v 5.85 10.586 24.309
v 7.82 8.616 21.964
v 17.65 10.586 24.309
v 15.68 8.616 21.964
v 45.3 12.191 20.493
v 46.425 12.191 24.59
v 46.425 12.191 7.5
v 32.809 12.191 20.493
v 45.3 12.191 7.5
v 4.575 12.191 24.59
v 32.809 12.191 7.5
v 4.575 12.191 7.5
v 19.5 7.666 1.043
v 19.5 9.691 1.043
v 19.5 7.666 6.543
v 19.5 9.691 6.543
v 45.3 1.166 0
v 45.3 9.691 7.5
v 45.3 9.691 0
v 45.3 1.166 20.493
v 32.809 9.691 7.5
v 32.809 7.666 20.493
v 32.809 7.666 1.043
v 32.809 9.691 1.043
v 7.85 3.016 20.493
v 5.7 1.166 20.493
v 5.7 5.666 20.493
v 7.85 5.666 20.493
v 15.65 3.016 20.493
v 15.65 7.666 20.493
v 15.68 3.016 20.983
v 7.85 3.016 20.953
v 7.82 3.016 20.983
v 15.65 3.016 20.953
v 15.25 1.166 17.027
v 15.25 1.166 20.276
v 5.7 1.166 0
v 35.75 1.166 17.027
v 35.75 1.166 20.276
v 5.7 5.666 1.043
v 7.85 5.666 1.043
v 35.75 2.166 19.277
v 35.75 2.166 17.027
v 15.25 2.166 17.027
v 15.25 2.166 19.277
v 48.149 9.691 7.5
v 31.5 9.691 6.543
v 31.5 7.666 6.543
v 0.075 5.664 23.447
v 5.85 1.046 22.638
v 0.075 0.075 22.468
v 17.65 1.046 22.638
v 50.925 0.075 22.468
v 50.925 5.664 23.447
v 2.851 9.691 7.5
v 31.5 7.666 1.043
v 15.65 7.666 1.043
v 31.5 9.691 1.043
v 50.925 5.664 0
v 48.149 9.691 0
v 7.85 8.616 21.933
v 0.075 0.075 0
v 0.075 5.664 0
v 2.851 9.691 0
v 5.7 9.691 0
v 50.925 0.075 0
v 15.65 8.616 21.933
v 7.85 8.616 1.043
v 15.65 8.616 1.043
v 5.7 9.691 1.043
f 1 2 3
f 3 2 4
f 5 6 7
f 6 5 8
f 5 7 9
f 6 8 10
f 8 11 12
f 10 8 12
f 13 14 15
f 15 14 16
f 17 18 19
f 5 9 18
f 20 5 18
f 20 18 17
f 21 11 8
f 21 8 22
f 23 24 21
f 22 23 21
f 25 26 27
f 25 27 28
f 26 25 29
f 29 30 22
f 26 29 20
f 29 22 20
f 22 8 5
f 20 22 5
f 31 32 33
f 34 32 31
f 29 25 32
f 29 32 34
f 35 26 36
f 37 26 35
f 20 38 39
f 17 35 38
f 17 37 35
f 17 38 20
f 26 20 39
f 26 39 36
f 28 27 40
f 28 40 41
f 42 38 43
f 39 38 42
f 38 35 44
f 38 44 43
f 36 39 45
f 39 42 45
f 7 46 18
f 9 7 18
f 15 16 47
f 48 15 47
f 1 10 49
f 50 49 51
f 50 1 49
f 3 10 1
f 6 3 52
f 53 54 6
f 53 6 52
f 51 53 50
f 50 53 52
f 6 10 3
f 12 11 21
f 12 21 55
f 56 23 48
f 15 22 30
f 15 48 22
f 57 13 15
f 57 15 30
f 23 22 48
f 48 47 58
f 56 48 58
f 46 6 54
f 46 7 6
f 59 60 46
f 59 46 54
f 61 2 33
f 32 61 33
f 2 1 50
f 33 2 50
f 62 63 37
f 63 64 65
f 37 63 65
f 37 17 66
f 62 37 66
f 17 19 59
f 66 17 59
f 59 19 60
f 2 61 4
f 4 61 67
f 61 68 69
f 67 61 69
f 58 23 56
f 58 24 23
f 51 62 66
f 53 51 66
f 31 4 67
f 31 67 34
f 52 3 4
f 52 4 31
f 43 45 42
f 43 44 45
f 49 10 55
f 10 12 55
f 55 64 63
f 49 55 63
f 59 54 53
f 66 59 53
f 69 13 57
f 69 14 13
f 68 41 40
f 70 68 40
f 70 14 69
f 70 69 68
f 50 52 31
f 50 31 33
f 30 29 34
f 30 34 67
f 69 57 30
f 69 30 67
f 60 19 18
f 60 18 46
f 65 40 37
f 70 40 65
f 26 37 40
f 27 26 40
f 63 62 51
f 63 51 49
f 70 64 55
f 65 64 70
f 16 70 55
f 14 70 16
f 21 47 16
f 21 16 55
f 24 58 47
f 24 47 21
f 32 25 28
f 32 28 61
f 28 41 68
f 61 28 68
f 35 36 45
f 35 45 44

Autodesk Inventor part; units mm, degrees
ref_plane "YZ Plane" through (0, 0, 0) normal (1, 0, 0) x (0, 1, 0)
ref_plane "XZ Plane" through (0, 0, 0) normal (0, 1, 0) x (-1, 0, 0)
sketch "Sketch1" plane through (0, 0, 0) normal (0, 0, 1) x (1, 0, 0)
  line L0 (0, 0) -> (51, 0)
  line L1 (51, 0) -> (51, 5.739)
  line L2 (51, 5.739) -> (0, 5.739) construction
  line L3 (0, 5.739) -> (0, 0)
  line L4 (4.5, 5.739) -> (46.5, 5.739)
  line L5 (46.5, 5.739) -> (46.5, 12.266) construction
  line L6 (46.5, 12.266) -> (4.5, 12.266)
  line L7 (4.5, 12.266) -> (4.5, 5.739) construction
  line L8 (4.5, 12.266) -> (0, 5.739)
  line L9 (46.5, 12.266) -> (51, 5.739)
  dimension "d0" = 51
  dimension "d1" = 5.739
  dimension "d2" = 42
  dimension "d3" = 4.5
  dimension "d4" = 12.266
extrude "Extrusion1" add sketch "Sketch1" along normal blind 22.455
sketch "Sketch2" plane through (51, 0, 0) normal (1, 0, 0) x (0, 0, -1)
  line L0 (-22.455, 12.266) -> (-22.455, 5.739) projected
  line L1 (-22.455, 12.266) -> (-24.603, 12.266)
  line L2 (-22.455, 5.739) -> (-22.455, 0) projected
  line L3 (-24.603, 12.266) -> (-22.455, 0)
  line L4 (-22.455, 0) -> (-22.455, 12.266)
  point P0 (0, 0)
  dimension "d7" = 2.148
extrude "Extrusion2" add sketch "Sketch2" against normal up to surface (51 mm away)
sketch "Sketch3" plane through (0, 0, 0) normal (0, 0, -1) x (-1, 0, 0)
  line L0 (-51, 5.739) -> (-46.5, 12.266) projected
  line L1 (-46.5, 12.266) -> (-51, 5.739)
  line L2 (-51, 5.739) -> (-60.9571, 11.6755)
  line L3 (-60.9571, 11.6755) -> (-47.5167, 21.4504)
  line L4 (-47.5167, 21.4504) -> (-46.5, 12.266)
  line L5 (-4.5, 12.266) -> (0, 12.266) projected
  line L6 (-46.5, 12.266) -> (-4.5, 12.266)
  line L7 (-4.5, 12.266) -> (0, 5.739) projected
  line L8 (-4.5, 12.266) -> (0, 5.739)
  line L9 (0, 5.739) -> (11.7434, 10.0464)
  line L10 (11.7434, 10.0464) -> (6.509, 19.8561)
  line L11 (6.509, 19.8561) -> (-3.5865, 15.5171)
  line L12 (-3.5865, 15.5171) -> (-4.5, 12.266)
  point P0 (0, 0)
extrude "Extrusion3" cut sketch "Sketch3" against normal up to surface surface through (51, 0, 22.455) normal (0, -0.1725, 0.985)
sketch "Sketch4" plane through (4.5, 12.266, 0) normal (0, 1, 0) x (1, 0, 0)
  line L0 (1.5, -1.193) -> (40.5, -1.193)
  line L1 (40.5, -1.193) -> (40.5, -20.193)
  line L2 (40.5, -20.193) -> (1.5, -20.193)
  line L3 (1.5, -20.193) -> (1.5, -1.193)
  line L4 (-4.5, 0) -> (-4.5, -23.46) projected
  line L5 (46.5, 0) -> (46.5, -23.46) projected
  line L6 (42, 0) -> (0, 0) projected
  dimension "d12" = 39
  dimension "d13" = 6
  dimension "d14" = 51
  dimension "d15" = 1.193
  dimension "d16" = 19
extrude "Extrusion4" cut sketch "Sketch4" against normal blind 11.1
sketch "Sketch5" plane through (6, 12.266, 1.193) normal (0, 0, 1) x (1, 0, 0)
  line L0 (8.3, -6.1) -> (13.3, -6.1)
  line L1 (13.3, -6.1) -> (13.3, -3.6)
  line L2 (13.3, -3.6) -> (8.3, -3.6)
  line L3 (8.3, -3.6) -> (8.3, -6.1)
  line L4 (25.7, -6.1) -> (30.7, -6.1)
  line L5 (30.7, -6.1) -> (30.7, -3.6)
  line L6 (30.7, -3.6) -> (25.7, -3.6)
  line L7 (25.7, -3.6) -> (25.7, -6.1)
  line L8 (0, -11.1) -> (39, -11.1) projected
  line L9 (15.3, -4.0951) -> (23.7, -4.0951) construction
  line L10 (23.7, -4.0951) -> (23.7, -9.0951) construction
  line L11 (23.7, -9.0951) -> (15.3, -9.0951) construction
  line L12 (15.3, -9.0951) -> (15.3, -4.0951) construction
  line L13 (0, 0) -> (0, -11.1) projected
  line L14 (39, 0) -> (39, -11.1) projected
  point P0 (-6, -12.266)
  dimension "d19" = 5
  dimension "d20" = 5
  dimension "d23" = 2.5
  dimension "d24" = 5
  dimension "d25" = 0
  dimension "d26" = 5
  dimension "d27" = 8.4
  dimension "d28" = 5
  dimension "d29" = 15.3
  dimension "d30" = 15.3
  dimension "d31" = 2
  dimension "d32" = 2
extrude "Extrusion5" add sketch "Sketch5" along normal blind 6
sketch "Sketch6" plane through (4.5, 1.166, 0) normal (0, 1, 0) x (1, 0, 0)
  line L0 (10.75, -17.0266) -> (31.25, -17.0266)
  line L1 (31.25, -17.0266) -> (31.25, -19.2766)
  line L2 (31.25, -19.2766) -> (10.75, -19.2766)
  line L3 (10.75, -19.2766) -> (10.75, -17.0266)
  line L4 (1.5, -20.193) -> (1.5, -1.193) projected
  point P0 (-4.5, 0)
  dimension "d35" = 2.25
  dimension "d36" = 20.5
  dimension "d37" = 9.25
extrude "Extrusion6" add sketch "Sketch6" along normal blind 1
sketch "Sketch7" plane through (45, 12.266, 20.193) normal (0, 0, -1) x (-1, 0, 0)
  line L0 (37, -7.5) -> (29.5, -7.5)
  line L1 (29.5, -7.5) -> (29.5, -3.8)
  line L2 (29.5, -3.8) -> (37, -3.8)
  line L3 (37, -3.8) -> (37, -7.5)
  line L4 (0, -11.1) -> (39, -11.1) projected
  line L5 (39, 0) -> (39, -11.1) projected
  line L6 (29.75, -10.1) -> (9.25, -10.1) projected
  point P0 (45, -12.266)
  dimension "d40" = 7.5
  dimension "d41" = 3.7
  dimension "d43" = 2
  dimension "d106" = 2.6
extrude "Extrusion7" cut sketch "Sketch7" against normal blind 8.25
sketch "Sketch9" plane through (4.5, 1.166, 0) normal (0, 1, 0) x (1, 0, 0)
  line L0 (9.8, -7.193) -> (14.8, -7.193) projected
  circle A0 centre (9.8, -7.193) radius 0.5
  circle A1 centre (14.8, -7.193) radius 0.5
  circle A2 centre (27.2, -7.193) radius 0.5
  line L1 (27.2, -7.193) -> (32.2, -7.193) projected
  circle A3 centre (32.2, -7.193) radius 0.5
  point P0 (-4.5, 0)
  dimension "d51" = 1
  dimension "d52" = 1
  dimension "d53" = 1
  dimension "d54" = 1
extrude "Extrusion9" add sketch "Sketch9" along normal blind 1
sketch "Sketch10" plane through (14.3, 2.166, 7.193) normal (0, 1, 0) x (1, 0, 0)
  line L0 (0, 0) -> (5, 0) projected
  circle A0 centre (0, 0) radius 1
  line L1 (5, 6) -> (5, 0) projected
  circle A1 centre (5, 0) radius 1
  circle A2 centre (17.4, 0) radius 0.5 projected
  circle A3 centre (17.4, 0) radius 1
  line L2 (17.4, 0) -> (22.4, 0) projected
  circle A4 centre (22.4, 0) radius 1
  point P0 (-14.3, 7.193)
  dimension "d57" = 2
  dimension "d58" = 2
  dimension "d59" = 2
  dimension "d60" = 2
extrude "Extrusion10" add sketch "Sketch10" along normal blind 3 contours A1 L1 L0 | L0 L1 A1 | A0 | A2 | A3 | A4
sketch "Sketch11" plane through (14.3, 5.166, 7.193) normal (0, 1, 0) x (1, 0, 0)
  circle A0 centre (0, 0) radius 0.5 projected
  circle A1 centre (0, 0) radius 0.5
  circle A2 centre (5, 0) radius 0.5 projected
  circle A3 centre (5, 0) radius 0.5
  circle A4 centre (17.4, 0) radius 0.5 projected
  circle A5 centre (17.4, 0) radius 0.5
  circle A6 centre (22.4, 0) radius 0.5 projected
  circle A7 centre (22.4, 0) radius 0.5
  point P0 (-14.3, 7.193)
extrude "Extrusion11" add sketch "Sketch11" along normal blind 1
ref_plane "Work Plane1" through (4.65, 12.116, 0) normal (0, 1, 0) x (1, 0, 0)
sketch "Sketch13" plane through (4.65, 12.116, 0) normal (0, 1, 0) x (1, 0, 0)
  line L0 (40.35, -20.193) -> (1.35, -20.193) projected
  line L1 (1.35, -20.193) -> (40.35, -20.193)
  line L2 (40.35, -20.193) -> (40.35, -20.343)
  line L3 (40.35, -20.343) -> (1.35, -20.343)
  line L4 (40.35, -20.343) -> (40.5, -20.343)
  line L5 (40.5, -20.343) -> (40.5, -1.193)
  line L6 (40.5, -1.193) -> (40.35, -1.193)
  line L7 (40.35, -1.193) -> (40.35, -20.343)
  line L8 (40.5, -1.193) -> (1.35, -1.193)
  line L9 (1.35, -1.193) -> (1.35, -1.043)
  line L10 (1.35, -1.043) -> (40.5, -1.043)
  line L11 (40.5, -1.043) -> (40.5, -1.193)
  line L12 (1.35, -1.043) -> (1.2, -1.043)
  line L13 (1.2, -1.043) -> (1.2, -20.343)
  line L14 (1.2, -20.343) -> (1.35, -20.343)
  line L15 (1.35, -20.193) -> (1.35, -1.043)
  point P0 (-4.65, 0)
  point P1 (1.35, -20.193)
  point P2 (1.35, -1.193)
  dimension "d77" = 0.15
  dimension "d78" = 0.15
  dimension "d79" = 0.15
  dimension "d80" = 0.15
extrude "Extrusion13" cut sketch "Sketch13" along normal blind 10.95 and the other way blind 10.95 contours L2 L3 L14 L13 L12 L9 L15 L0 | L7 L6 L5 L4 L2 | L8 L9 L10 L11 L6
sketch "Sketch14" plane through (14.3, 8.666, 7.193) normal (0, 1, 0) x (1, 0, 0)
  line L0 (0, 6) -> (5, 6) projected
  line L1 (0, 6) -> (5, 6)
  line L2 (5, 6) -> (5, 6.15)
  line L3 (5, 6.15) -> (0, 6.15)
  line L4 (0, 6.15) -> (0, 6)
  line L5 (17.4, 6) -> (17.4, 0) projected
  line L6 (17.4, 6) -> (22.4, 6)
  line L7 (22.4, 6) -> (22.4, 6.15)
  line L8 (22.4, 6.15) -> (17.4, 6.15)
  line L9 (17.4, 6.15) -> (17.4, 6)
  point P0 (-14.3, 7.193)
  dimension "d83" = 5
  dimension "d84" = 0.15
  dimension "d85" = 5
  dimension "d86" = 0.15
extrude "Extrusion14" add sketch "Sketch14" against normal up to surface (2.5 mm away)
sketch "Sketch16" plane through (4.5, 12.266, 24.603) normal (0, 1, 0) x (1, 0, 0)
  line L0 (1.35, 23.56) -> (40.65, 23.56) projected
  line L1 (1.35, 23.56) -> (1.2, 23.56)
  line L2 (1.2, 23.56) -> (1.2, 4.11)
  line L3 (1.2, 4.11) -> (1.35, 4.11)
  line L4 (1.35, 4.11) -> (1.35, 23.56)
  line L5 (40.65, 4.26) -> (1.35, 4.26) projected
  line L6 (40.65, 4.26) -> (1.35, 4.26) projected
  line L7 (1.35, 4.11) -> (40.65, 4.11)
  line L8 (40.65, 4.11) -> (40.65, 4.26)
  line L9 (40.65, 4.26) -> (1.35, 4.26)
  line L10 (1.35, 4.26) -> (1.35, 4.11)
  line L11 (40.65, 4.11) -> (40.8, 4.11)
  line L12 (40.8, 4.11) -> (40.8, 23.56)
  line L13 (40.8, 23.56) -> (40.65, 23.56)
  line L14 (40.65, 23.56) -> (40.65, 4.11)
  point P0 (-4.5, 24.603)
  point P1 (14.8, 23.56)
  point P2 (40.65, 4.26)
  dimension "d96" = 0.15
  dimension "d97" = 0.15
  dimension "d98" = 0.15
extrude "Extrusion16" cut sketch "Sketch16" against normal up to surface (11.1 mm away) contours L4 L3 L2 L1 | L13 L12 L11 L8 L14 | L5 L8 L7 L4
sketch "Sketch17" plane through (14.3, 8.666, 7.193) normal (0, 1, 0) x (1, 0, 0)
  line L0 (31, 6.15) -> (-8.6, 6.15) projected
  line L1 (-3.1355, -2.3842) -> (26.7601, -2.3842)
  line L2 (26.7601, -2.3842) -> (26.7601, 6.15)
  line L3 (26.7601, 6.15) -> (-3.1355, 6.15)
  line L4 (-3.1355, 6.15) -> (-3.1355, -2.3842)
  point P0 (-14.3, 7.193)
  point P1 (-3.1355, 6.15)
extrude "Extrusion17" cut sketch "Sketch17" against normal up to surface (7.5 mm away)
sketch "Sketch18" plane through (45.3, 12.266, 20.493) normal (0, 0, -1) x (-1, 0, 0)
  line L0 (37.3, -3.8) -> (29.8, -3.8) projected
  line L1 (29.8, -7.5) -> (37.3, -7.5) projected
  line L2 (29.8, -3.8) -> (37.3, -3.8)
  line L3 (37.3, -3.8) -> (37.3, -7.5)
  line L4 (37.3, -7.5) -> (29.8, -7.5)
  line L5 (29.8, -6.6) -> (29.8, -3.8)
  line L6 (0, -10.1) -> (39.6, -10.1)
  line L7 (39.6, -10.1) -> (39.6, -6.6)
  line L8 (0, -6.6) -> (0, -10.1)
  line L9 (39.6, -11.1) -> (0, -11.1) projected
  line L10 (0, 0) -> (0, -11.1) projected
  line L11 (39.6, 0) -> (39.6, -11.1) projected
  line L12 (12.4908, -6.6) -> (0, -6.6)
  line L13 (0, -6.6) -> (0, 1.6477)
  line L14 (0, 1.6477) -> (12.4908, 1.6477)
  line L15 (12.4908, 1.6477) -> (12.4908, -6.6)
  line L16 (39.6, -6.6) -> (37.3, -6.6)
  line L17 (29.8, -6.6) -> (0, -6.6)
  point P0 (45.3, -12.266)
  point P1 (37.3, -3.8)
  dimension "d107" = 1
  dimension "d108" = 0
  dimension "d109" = 0
  dimension "d110" = 3.5
extrude "Extrusion18" cut sketch "Sketch18" along normal up to surface (20.493 mm away) contours L3 L16 L7 L6 L8 L12 L17 L5 L0 | L12 L10 L13 L14 L15
sketch "Sketch19" plane through (5.7, 12.266, 1.043) normal (0, 0, 1) x (1, 0, 0)
  line L0 (0, 0) -> (0, -6.6) projected
  line L1 (0, 0) -> (0, -6.6)
  line L2 (0, -6.6) -> (2.3, -6.6) projected
  line L3 (0, -6.6) -> (2.3, -6.6)
  line L4 (2.3, -3.8) -> (2.3, -6.6) projected
  line L5 (2.3, -6.6) -> (2.3, -3.8)
  line L6 (9.8, -6.6) -> (9.8, -3.8) projected
  line L7 (2.3, -3.8) -> (9.8, -3.8)
  line L8 (9.8, -6.6) -> (27.1092, -6.6) projected
  line L9 (9.8, -3.8) -> (9.8, -6.6)
  line L10 (9.8, -6.6) -> (27.1092, -6.6)
  line L11 (27.1092, 0) -> (27.1092, -6.6) projected
  line L12 (27.1092, -6.6) -> (27.1092, 0)
  line L13 (0, 0) -> (27.1092, 0) projected
  line L14 (27.1092, 0) -> (0, 0)
  point P0 (-5.7, -12.266)
extrude "Extrusion19" add sketch "Sketch19" along normal up to surface (19.45 mm away)
chamfer "Chamfer5" distance 1 angle 45 1 edges at (25.5, 1.166, 19.2766)
sketch "Sketch20" plane through (4.5, 12.266, 24.603) normal (0, 1, 0) x (1, 0, 0)
  line L0 (27, 23.56) -> (15, 23.56)
  line L1 (15, 23.56) -> (15, 18.06)
  line L2 (15, 18.06) -> (27, 18.06)
  line L3 (27, 18.06) -> (27, 23.56)
  line L4 (42, 24.603) -> (42, 0) projected
  line L5 (40.8, 23.56) -> (1.2, 23.56) projected
  line L6 (40.8, 4.11) -> (40.8, 23.56) projected
  line L7 (28.3092, 24.603) -> (0, 24.603) projected
  line L8 (40.8, 23.56) -> (0, 23.56)
  line L9 (0, 23.56) -> (0, 24.603)
  line L10 (0, 24.603) -> (40.8, 24.603)
  line L11 (40.8, 24.603) -> (40.8, 23.56)
  line L12 (1.2, 23.56) -> (1.2, 24.603) projected
  line L13 (1.2, 23.56) -> (1.2, 24.603)
  point P0 (-4.5, 24.603)
  point P1 (28.3092, 24.603)
  dimension "d118" = 12
  dimension "d119" = 5.5
  dimension "d120" = 15
  dimension "d121" = 0
extrude "Extrusion20" cut sketch "Sketch20" against normal up to surface (11.1 mm away) contours L3 L2 L1 L0 | L0 L5 L12 L7 L10 L11
sketch "Sketch21" plane through (19.5, 12.266, 1.043) normal (0, 0, -1) x (-1, 0, 0)
  line L0 (11.65, -3.65) -> (3.85, -3.65)
  line L1 (3.85, -3.65) -> (3.85, -7.65)
  line L2 (3.85, -7.65) -> (11.65, -7.65)
  line L3 (11.65, -7.65) -> (11.65, -3.65)
  line L4 (4, -7.5) -> (11.5, -7.5) projected
  line L5 (11.5, -6.6) -> (11.5, -3.8) projected
  line L6 (11.5, -3.8) -> (4, -3.8) projected
  line L7 (4, -3.8) -> (4, -6.6) projected
  point P0 (19.5, -12.266)
  dimension "d127" = 0.15
  dimension "d128" = 0.15
  dimension "d129" = 0.15
  dimension "d130" = 0.15
extrude "Extrusion21" cut sketch "Sketch21" against normal blind 31.75
sketch "Sketch22" plane through (0, 0, 0) normal (0, 0, -1) x (-1, 0, 0)
  line L0 (0, 0) -> (-51, 0) projected
  line L1 (-48.0686, 0.075) -> (-48.0686, 5.664)
  line L2 (-48.0686, 5.664) -> (-50.925, 5.664)
  line L3 (-50.925, 5.664) -> (-50.925, 0)
  line L4 (-51, 0) -> (-51, 5.739) projected
  line L5 (-46.425, 12.191) -> (-4.575, 12.191)
  line L6 (-4.575, 12.191) -> (-4.575, 10.7889)
  line L7 (-4.575, 10.7889) -> (-46.425, 10.7889)
  line L8 (-46.425, 10.7889) -> (-46.425, 12.191)
  line L9 (-46.5, 12.266) -> (-45.3, 12.266) projected
  line L10 (-46.425, 12.191) -> (-50.925, 5.664)
  line L11 (-4.5, 12.266) -> (0, 5.739) projected
  line L12 (-4.5, 12.266) -> (-4.5, 12.191)
  line L13 (-0.075, 5.664) -> (-3.316, 5.664)
  line L14 (-3.316, 5.664) -> (-3.316, 0.075)
  line L15 (-3.316, 0.075) -> (-0.075, 0.075)
  line L16 (-0.075, 0.075) -> (-0.075, 5.664)
  line L17 (0, 5.739) -> (0, 0) projected
  line L18 (-2.5152, 0.075) -> (-50.925, 0.075)
  line L19 (-4.575, 12.191) -> (-0.075, 5.664)
  line L20 (-56.1384, 19.3089) -> (5.3799, 19.3089)
  line L21 (5.3799, 19.3089) -> (5.3799, -4.8972)
  line L22 (5.3799, -4.8972) -> (-56.1384, -4.8972)
  line L23 (-56.1384, -4.8972) -> (-56.1384, 19.3089)
  point P0 (-3.316, 0.075)
  dimension "d133" = 0.075
  dimension "d134" = 0.075
  dimension "d135" = 0.075
  dimension "d136" = 0.075
  dimension "d137" = 0.075
  dimension "d138" = 0.075
  dimension "d139" = 0.075
  dimension "d140" = 0.075
extrude "Extrusion22" cut sketch "Sketch22" against normal blind 29
sketch "Sketch23" plane through (15.65, 8.616, 1.043) normal (0, 0, -1) x (-1, 0, 0)
  line L0 (0, -2.95) -> (0, 0) projected
  line L1 (0, 0) -> (7.8, 0)
  line L2 (7.8, 0) -> (7.8, -5.6)
  line L3 (7.8, -5.6) -> (0, -5.6)
  line L4 (0, -5.6) -> (0, 0)
  line L5 (7.8, -4) -> (0, -4) projected
  line L6 (0, -2.95) -> (-17.1592, -2.95) projected
  line L7 (-17.1592, -2.95) -> (-17.1592, 3.575) projected
  line L8 (0, -2.95) -> (-17.1592, -2.95)
  line L9 (-17.1592, -2.95) -> (-17.1592, -0.95)
  line L10 (-17.1592, -0.95) -> (0, -0.95)
  line L11 (0, -0.95) -> (0, -2.95)
  point P0 (15.65, -8.616)
  point P1 (0, -0.95)
  dimension "d143" = 1.6
  dimension "d144" = 2
extrude "Extrusion23" cut sketch "Sketch23" against normal up to surface contours L0 L1 L2 L5 L4 | L5 L2 L3 L4 surface through (51, 0, 22.455) normal (0, -0.1725, 0.985)
extrude "Extrusion24" cut sketch "Sketch23" against normal up to surface (19.45 mm away) contours L6 L7 L10 L0
chamfer "Chamfer7" distance 2 angle 45 4 edges at (11.75, 8.616, 23.9638) (7.85, 5.816, 23.4735) (15.65, 5.816, 23.4735) (11.75, 3.016, 22.9832)
sketch "Sketch24" plane through (0, 0, 0) normal (0, 0, -1) x (-1, 0, 0)
  line L0 (-51.2021, 14.8719) -> (1.5276, 14.8719)
  line L1 (1.5276, 14.8719) -> (1.5276, 9.691)
  line L2 (1.5276, 9.691) -> (-51.2021, 9.691)
  line L3 (-51.2021, 9.691) -> (-51.2021, 14.8719)
  line L4 (-45.3, 12.191) -> (-46.425, 12.191) projected
  point P0 (0, 0)
  dimension "d152" = 2.5
extrude "Extrusion25" cut sketch "Sketch24" against normal blind 7.5
properties part number "eonPCBcarrier"
